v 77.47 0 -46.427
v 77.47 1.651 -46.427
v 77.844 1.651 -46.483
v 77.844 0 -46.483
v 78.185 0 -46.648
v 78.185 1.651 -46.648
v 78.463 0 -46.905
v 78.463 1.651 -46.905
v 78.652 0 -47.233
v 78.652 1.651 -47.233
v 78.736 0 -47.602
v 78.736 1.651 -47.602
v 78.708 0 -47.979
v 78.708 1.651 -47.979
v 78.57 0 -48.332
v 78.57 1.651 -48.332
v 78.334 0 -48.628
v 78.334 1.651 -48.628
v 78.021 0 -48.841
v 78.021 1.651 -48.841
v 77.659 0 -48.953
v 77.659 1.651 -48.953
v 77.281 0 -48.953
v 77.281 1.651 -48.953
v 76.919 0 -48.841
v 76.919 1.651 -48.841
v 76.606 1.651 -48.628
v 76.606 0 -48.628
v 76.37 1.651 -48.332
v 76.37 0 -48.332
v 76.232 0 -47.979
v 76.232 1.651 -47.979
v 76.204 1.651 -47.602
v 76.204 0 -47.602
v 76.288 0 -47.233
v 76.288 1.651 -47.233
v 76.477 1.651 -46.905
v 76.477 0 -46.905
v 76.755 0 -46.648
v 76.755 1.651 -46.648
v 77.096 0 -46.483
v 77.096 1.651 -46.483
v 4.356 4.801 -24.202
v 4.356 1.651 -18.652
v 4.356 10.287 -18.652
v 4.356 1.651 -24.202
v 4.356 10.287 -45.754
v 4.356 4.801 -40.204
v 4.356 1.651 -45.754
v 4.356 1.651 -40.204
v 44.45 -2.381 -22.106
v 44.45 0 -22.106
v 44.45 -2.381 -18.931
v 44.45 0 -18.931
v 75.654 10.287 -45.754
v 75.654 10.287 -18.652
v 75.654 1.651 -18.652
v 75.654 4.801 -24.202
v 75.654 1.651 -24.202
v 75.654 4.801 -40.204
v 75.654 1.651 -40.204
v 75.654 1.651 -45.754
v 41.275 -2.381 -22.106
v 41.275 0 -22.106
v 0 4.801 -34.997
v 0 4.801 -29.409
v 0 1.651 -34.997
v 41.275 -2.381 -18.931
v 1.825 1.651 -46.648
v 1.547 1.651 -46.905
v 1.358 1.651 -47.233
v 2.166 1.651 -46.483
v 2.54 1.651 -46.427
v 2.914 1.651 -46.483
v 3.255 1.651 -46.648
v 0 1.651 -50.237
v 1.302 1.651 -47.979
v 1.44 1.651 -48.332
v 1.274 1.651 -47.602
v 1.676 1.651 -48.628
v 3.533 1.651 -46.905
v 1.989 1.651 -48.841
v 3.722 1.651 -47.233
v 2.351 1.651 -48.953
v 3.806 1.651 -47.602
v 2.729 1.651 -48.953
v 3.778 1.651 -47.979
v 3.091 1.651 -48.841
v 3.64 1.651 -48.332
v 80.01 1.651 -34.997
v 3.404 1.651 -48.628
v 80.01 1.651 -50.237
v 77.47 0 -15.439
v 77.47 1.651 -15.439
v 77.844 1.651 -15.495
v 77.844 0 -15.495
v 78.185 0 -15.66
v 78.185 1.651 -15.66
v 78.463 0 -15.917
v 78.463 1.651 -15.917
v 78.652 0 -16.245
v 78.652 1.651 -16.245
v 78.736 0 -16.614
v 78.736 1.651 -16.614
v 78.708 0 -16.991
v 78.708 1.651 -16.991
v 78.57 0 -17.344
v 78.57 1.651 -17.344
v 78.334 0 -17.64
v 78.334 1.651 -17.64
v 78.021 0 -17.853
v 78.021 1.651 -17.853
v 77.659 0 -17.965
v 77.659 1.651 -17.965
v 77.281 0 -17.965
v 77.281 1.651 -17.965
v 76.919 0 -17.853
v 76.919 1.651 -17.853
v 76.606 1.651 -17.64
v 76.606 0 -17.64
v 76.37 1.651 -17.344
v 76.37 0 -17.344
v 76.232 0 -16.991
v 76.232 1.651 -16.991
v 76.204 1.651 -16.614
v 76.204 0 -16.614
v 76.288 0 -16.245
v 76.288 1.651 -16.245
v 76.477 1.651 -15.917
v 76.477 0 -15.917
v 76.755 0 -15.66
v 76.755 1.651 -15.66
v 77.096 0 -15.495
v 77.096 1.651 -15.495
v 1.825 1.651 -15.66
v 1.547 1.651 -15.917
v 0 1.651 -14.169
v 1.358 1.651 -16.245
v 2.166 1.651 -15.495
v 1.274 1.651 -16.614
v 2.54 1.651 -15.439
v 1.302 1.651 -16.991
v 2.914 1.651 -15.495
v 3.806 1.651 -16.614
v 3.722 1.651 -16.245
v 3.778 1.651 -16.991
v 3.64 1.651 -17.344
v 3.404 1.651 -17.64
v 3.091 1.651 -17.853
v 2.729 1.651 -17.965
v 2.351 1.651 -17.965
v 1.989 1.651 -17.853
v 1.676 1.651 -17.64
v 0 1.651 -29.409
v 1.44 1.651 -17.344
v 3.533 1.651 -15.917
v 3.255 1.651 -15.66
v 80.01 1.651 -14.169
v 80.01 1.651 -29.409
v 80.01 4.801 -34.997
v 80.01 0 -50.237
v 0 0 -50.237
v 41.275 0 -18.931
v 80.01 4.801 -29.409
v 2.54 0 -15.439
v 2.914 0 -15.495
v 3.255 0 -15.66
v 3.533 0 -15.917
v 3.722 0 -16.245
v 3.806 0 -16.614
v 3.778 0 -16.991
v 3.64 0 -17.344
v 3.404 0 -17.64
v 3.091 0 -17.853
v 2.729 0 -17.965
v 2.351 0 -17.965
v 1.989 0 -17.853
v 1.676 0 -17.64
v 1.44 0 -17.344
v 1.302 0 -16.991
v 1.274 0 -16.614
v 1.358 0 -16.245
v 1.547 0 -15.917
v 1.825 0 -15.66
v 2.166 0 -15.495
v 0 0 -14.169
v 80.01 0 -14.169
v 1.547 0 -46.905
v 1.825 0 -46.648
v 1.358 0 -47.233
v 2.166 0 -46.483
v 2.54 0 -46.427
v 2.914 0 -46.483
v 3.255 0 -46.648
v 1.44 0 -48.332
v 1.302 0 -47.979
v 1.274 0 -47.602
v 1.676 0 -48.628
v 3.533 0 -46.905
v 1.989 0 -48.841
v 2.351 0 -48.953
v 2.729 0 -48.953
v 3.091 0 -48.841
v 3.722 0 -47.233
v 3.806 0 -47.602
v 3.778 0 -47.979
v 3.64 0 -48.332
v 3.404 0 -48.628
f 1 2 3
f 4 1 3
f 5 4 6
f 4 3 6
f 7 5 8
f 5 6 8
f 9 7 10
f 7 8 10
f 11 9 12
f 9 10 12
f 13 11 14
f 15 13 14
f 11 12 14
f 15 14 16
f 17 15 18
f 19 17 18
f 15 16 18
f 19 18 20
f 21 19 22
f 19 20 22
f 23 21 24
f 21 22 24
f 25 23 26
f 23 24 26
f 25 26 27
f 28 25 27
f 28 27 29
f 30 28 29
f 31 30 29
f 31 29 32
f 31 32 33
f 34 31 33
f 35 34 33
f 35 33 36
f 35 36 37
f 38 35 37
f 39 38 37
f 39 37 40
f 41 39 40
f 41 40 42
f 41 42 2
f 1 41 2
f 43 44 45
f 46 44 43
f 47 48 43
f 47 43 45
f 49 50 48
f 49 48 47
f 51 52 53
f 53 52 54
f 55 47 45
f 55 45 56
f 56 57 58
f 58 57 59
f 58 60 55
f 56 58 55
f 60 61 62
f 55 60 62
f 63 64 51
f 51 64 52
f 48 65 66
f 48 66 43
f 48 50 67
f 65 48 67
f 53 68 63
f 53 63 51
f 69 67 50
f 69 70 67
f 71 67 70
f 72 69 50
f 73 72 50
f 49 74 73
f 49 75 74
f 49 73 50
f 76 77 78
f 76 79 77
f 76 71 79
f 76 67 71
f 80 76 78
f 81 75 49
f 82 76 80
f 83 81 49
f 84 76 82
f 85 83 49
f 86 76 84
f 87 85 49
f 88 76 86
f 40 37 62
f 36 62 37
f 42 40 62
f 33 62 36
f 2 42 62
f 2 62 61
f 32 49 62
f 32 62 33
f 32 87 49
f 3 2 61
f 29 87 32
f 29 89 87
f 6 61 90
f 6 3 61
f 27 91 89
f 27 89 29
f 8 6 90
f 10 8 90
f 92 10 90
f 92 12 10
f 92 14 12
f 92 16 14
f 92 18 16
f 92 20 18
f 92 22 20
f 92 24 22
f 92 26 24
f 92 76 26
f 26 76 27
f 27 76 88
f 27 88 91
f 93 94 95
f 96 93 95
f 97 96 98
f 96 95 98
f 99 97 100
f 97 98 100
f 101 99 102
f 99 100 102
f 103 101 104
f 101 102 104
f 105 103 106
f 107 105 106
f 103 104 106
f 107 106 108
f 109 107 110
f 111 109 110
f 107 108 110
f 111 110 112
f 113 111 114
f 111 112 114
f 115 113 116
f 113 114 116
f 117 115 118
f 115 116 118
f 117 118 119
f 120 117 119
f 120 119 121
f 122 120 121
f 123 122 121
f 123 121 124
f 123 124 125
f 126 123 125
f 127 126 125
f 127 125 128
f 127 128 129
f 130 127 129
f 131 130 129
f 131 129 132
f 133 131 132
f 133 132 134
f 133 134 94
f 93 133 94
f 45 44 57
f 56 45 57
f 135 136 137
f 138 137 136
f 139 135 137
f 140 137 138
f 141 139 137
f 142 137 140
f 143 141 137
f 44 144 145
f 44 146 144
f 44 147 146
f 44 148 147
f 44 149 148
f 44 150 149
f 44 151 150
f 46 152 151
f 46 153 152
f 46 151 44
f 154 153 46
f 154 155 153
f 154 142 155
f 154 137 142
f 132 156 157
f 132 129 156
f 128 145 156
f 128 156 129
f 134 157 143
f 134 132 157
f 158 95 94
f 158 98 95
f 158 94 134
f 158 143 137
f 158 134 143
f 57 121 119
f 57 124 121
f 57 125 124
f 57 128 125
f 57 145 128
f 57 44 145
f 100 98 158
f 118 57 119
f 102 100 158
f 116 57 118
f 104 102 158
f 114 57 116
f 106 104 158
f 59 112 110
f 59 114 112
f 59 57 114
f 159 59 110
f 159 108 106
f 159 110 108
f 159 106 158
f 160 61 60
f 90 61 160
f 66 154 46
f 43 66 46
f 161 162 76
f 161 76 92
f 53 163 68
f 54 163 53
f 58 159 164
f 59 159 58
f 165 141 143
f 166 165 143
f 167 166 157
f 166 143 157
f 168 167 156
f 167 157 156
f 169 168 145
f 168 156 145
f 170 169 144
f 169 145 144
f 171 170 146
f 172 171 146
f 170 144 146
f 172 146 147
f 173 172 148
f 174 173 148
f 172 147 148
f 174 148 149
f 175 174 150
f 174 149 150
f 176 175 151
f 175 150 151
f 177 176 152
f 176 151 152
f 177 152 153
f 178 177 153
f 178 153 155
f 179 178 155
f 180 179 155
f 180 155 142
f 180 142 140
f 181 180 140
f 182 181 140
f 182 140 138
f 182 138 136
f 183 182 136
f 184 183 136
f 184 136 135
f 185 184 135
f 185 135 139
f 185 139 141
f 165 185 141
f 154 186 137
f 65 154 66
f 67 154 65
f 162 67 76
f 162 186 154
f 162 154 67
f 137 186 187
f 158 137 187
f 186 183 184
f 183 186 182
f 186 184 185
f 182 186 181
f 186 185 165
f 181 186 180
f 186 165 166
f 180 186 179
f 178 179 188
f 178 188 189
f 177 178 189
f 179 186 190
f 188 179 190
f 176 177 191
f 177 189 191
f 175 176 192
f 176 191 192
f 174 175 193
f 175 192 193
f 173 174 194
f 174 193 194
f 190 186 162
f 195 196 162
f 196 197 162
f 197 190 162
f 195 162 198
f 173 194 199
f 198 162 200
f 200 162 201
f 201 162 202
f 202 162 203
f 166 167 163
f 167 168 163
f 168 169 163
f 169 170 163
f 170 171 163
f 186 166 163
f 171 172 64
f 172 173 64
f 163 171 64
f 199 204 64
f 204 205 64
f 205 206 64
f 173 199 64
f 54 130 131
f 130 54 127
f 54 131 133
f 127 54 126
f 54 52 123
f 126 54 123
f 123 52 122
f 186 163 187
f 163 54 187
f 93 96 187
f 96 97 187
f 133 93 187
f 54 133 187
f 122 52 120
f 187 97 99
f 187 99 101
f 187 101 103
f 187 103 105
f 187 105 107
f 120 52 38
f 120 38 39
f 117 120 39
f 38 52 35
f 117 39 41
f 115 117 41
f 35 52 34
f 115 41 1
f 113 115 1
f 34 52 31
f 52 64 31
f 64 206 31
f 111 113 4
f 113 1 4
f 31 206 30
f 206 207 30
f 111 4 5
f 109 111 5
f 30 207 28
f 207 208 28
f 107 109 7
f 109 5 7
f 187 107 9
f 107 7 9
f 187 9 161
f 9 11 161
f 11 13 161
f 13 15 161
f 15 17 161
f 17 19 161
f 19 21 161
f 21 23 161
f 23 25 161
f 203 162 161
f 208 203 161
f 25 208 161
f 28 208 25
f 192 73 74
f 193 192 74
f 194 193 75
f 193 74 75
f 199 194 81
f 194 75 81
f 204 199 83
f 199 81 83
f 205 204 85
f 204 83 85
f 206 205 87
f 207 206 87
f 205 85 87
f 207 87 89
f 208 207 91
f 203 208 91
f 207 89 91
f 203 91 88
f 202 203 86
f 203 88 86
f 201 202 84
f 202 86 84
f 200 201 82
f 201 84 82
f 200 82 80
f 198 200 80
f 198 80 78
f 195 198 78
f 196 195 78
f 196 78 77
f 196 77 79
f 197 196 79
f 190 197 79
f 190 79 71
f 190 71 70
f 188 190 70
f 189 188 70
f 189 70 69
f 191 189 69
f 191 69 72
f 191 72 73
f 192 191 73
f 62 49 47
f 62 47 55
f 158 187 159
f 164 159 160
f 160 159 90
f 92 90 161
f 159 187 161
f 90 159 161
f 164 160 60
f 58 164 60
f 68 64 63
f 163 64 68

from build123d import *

# Parameters (mm, degrees)
SKETCH1_W           = 80.01
SKETCH1_H           = 36.068
BOSS_EXTRUDE1_DEPTH = 1.651
SKETCH2_R           = 1.27
CUT_EXTRUDE1_DEPTH  = 2.54
SKETCH3_W           = 71.2978
SKETCH3_H           = 27.1018
BOSS_EXTRUDE2_DEPTH = 8.636
BOSS_EXTRUDE3_DEPTH = 3.1496
SKETCH5_W           = 3.175
SKETCH5_H           = 3.175
BOSS_EXTRUDE4_DEPTH = 2.38125


with BuildPart() as part:
    # Sketch1 → Boss-Extrude1 (new body)
    with BuildSketch(Plane(origin=(0, 0, 0), x_dir=(1, 0, 0), z_dir=(0, 1, 0))):
        with Locations((40.005, 32.202836909)):
            Rectangle(SKETCH1_W, SKETCH1_H)
    extrude(amount=BOSS_EXTRUDE1_DEPTH)

    # Sketch2 → Cut-Extrude1 (cut)
    with BuildSketch(Plane(origin=(0, 1.651, 0), x_dir=(1, 0, 0), z_dir=(0, 1, 0))):
        with Locations(Location((2.54, 47.696836909, 0), (0, 0, 270))):
            Circle(SKETCH2_R)
        with Locations(Location((2.54, 16.708836909, 0), (0, 0, 270))):
            Circle(SKETCH2_R)
        with Locations(Location((77.47, 47.696836909, 0), (0, 0, 270))):
            Circle(SKETCH2_R)
        with Locations(Location((77.47, 16.708836909, 0), (0, 0, 270))):
            Circle(SKETCH2_R)
    extrude(amount=-CUT_EXTRUDE1_DEPTH, mode=Mode.SUBTRACT)

    # Sketch3 → Boss-Extrude2 (add)
    with BuildSketch(Plane(origin=(0, 1.651, 0), x_dir=(1, 0, 0), z_dir=(0, 1, 0))):
        with Locations((40.005, 32.202836909)):
            Rectangle(SKETCH3_W, SKETCH3_H)
    extrude(amount=BOSS_EXTRUDE2_DEPTH)

    # Sketch4 → Boss-Extrude3 (add)
    with BuildSketch(Plane(origin=(0, 1.651, 0), x_dir=(1, 0, 0), z_dir=(0, 1, 0))):
        Polygon((4.3561, 40.203836909), (0, 34.996836909), (0, 29.408836909), (4.3561, 24.201836909), align=None)
    boss_extrude3 = extrude(amount=BOSS_EXTRUDE3_DEPTH)

    # Mirror1: Boss-Extrude3 across plane
    add(boss_extrude3.mirror(Plane.ZY.offset(-40.005)))

    # Sketch5 → Boss-Extrude4 (add)
    with BuildSketch(Plane.XZ):
        with Locations((42.8625, -20.518836909)):
            Rectangle(SKETCH5_W, SKETCH5_H)
    extrude(amount=BOSS_EXTRUDE4_DEPTH)


solid = part.part
